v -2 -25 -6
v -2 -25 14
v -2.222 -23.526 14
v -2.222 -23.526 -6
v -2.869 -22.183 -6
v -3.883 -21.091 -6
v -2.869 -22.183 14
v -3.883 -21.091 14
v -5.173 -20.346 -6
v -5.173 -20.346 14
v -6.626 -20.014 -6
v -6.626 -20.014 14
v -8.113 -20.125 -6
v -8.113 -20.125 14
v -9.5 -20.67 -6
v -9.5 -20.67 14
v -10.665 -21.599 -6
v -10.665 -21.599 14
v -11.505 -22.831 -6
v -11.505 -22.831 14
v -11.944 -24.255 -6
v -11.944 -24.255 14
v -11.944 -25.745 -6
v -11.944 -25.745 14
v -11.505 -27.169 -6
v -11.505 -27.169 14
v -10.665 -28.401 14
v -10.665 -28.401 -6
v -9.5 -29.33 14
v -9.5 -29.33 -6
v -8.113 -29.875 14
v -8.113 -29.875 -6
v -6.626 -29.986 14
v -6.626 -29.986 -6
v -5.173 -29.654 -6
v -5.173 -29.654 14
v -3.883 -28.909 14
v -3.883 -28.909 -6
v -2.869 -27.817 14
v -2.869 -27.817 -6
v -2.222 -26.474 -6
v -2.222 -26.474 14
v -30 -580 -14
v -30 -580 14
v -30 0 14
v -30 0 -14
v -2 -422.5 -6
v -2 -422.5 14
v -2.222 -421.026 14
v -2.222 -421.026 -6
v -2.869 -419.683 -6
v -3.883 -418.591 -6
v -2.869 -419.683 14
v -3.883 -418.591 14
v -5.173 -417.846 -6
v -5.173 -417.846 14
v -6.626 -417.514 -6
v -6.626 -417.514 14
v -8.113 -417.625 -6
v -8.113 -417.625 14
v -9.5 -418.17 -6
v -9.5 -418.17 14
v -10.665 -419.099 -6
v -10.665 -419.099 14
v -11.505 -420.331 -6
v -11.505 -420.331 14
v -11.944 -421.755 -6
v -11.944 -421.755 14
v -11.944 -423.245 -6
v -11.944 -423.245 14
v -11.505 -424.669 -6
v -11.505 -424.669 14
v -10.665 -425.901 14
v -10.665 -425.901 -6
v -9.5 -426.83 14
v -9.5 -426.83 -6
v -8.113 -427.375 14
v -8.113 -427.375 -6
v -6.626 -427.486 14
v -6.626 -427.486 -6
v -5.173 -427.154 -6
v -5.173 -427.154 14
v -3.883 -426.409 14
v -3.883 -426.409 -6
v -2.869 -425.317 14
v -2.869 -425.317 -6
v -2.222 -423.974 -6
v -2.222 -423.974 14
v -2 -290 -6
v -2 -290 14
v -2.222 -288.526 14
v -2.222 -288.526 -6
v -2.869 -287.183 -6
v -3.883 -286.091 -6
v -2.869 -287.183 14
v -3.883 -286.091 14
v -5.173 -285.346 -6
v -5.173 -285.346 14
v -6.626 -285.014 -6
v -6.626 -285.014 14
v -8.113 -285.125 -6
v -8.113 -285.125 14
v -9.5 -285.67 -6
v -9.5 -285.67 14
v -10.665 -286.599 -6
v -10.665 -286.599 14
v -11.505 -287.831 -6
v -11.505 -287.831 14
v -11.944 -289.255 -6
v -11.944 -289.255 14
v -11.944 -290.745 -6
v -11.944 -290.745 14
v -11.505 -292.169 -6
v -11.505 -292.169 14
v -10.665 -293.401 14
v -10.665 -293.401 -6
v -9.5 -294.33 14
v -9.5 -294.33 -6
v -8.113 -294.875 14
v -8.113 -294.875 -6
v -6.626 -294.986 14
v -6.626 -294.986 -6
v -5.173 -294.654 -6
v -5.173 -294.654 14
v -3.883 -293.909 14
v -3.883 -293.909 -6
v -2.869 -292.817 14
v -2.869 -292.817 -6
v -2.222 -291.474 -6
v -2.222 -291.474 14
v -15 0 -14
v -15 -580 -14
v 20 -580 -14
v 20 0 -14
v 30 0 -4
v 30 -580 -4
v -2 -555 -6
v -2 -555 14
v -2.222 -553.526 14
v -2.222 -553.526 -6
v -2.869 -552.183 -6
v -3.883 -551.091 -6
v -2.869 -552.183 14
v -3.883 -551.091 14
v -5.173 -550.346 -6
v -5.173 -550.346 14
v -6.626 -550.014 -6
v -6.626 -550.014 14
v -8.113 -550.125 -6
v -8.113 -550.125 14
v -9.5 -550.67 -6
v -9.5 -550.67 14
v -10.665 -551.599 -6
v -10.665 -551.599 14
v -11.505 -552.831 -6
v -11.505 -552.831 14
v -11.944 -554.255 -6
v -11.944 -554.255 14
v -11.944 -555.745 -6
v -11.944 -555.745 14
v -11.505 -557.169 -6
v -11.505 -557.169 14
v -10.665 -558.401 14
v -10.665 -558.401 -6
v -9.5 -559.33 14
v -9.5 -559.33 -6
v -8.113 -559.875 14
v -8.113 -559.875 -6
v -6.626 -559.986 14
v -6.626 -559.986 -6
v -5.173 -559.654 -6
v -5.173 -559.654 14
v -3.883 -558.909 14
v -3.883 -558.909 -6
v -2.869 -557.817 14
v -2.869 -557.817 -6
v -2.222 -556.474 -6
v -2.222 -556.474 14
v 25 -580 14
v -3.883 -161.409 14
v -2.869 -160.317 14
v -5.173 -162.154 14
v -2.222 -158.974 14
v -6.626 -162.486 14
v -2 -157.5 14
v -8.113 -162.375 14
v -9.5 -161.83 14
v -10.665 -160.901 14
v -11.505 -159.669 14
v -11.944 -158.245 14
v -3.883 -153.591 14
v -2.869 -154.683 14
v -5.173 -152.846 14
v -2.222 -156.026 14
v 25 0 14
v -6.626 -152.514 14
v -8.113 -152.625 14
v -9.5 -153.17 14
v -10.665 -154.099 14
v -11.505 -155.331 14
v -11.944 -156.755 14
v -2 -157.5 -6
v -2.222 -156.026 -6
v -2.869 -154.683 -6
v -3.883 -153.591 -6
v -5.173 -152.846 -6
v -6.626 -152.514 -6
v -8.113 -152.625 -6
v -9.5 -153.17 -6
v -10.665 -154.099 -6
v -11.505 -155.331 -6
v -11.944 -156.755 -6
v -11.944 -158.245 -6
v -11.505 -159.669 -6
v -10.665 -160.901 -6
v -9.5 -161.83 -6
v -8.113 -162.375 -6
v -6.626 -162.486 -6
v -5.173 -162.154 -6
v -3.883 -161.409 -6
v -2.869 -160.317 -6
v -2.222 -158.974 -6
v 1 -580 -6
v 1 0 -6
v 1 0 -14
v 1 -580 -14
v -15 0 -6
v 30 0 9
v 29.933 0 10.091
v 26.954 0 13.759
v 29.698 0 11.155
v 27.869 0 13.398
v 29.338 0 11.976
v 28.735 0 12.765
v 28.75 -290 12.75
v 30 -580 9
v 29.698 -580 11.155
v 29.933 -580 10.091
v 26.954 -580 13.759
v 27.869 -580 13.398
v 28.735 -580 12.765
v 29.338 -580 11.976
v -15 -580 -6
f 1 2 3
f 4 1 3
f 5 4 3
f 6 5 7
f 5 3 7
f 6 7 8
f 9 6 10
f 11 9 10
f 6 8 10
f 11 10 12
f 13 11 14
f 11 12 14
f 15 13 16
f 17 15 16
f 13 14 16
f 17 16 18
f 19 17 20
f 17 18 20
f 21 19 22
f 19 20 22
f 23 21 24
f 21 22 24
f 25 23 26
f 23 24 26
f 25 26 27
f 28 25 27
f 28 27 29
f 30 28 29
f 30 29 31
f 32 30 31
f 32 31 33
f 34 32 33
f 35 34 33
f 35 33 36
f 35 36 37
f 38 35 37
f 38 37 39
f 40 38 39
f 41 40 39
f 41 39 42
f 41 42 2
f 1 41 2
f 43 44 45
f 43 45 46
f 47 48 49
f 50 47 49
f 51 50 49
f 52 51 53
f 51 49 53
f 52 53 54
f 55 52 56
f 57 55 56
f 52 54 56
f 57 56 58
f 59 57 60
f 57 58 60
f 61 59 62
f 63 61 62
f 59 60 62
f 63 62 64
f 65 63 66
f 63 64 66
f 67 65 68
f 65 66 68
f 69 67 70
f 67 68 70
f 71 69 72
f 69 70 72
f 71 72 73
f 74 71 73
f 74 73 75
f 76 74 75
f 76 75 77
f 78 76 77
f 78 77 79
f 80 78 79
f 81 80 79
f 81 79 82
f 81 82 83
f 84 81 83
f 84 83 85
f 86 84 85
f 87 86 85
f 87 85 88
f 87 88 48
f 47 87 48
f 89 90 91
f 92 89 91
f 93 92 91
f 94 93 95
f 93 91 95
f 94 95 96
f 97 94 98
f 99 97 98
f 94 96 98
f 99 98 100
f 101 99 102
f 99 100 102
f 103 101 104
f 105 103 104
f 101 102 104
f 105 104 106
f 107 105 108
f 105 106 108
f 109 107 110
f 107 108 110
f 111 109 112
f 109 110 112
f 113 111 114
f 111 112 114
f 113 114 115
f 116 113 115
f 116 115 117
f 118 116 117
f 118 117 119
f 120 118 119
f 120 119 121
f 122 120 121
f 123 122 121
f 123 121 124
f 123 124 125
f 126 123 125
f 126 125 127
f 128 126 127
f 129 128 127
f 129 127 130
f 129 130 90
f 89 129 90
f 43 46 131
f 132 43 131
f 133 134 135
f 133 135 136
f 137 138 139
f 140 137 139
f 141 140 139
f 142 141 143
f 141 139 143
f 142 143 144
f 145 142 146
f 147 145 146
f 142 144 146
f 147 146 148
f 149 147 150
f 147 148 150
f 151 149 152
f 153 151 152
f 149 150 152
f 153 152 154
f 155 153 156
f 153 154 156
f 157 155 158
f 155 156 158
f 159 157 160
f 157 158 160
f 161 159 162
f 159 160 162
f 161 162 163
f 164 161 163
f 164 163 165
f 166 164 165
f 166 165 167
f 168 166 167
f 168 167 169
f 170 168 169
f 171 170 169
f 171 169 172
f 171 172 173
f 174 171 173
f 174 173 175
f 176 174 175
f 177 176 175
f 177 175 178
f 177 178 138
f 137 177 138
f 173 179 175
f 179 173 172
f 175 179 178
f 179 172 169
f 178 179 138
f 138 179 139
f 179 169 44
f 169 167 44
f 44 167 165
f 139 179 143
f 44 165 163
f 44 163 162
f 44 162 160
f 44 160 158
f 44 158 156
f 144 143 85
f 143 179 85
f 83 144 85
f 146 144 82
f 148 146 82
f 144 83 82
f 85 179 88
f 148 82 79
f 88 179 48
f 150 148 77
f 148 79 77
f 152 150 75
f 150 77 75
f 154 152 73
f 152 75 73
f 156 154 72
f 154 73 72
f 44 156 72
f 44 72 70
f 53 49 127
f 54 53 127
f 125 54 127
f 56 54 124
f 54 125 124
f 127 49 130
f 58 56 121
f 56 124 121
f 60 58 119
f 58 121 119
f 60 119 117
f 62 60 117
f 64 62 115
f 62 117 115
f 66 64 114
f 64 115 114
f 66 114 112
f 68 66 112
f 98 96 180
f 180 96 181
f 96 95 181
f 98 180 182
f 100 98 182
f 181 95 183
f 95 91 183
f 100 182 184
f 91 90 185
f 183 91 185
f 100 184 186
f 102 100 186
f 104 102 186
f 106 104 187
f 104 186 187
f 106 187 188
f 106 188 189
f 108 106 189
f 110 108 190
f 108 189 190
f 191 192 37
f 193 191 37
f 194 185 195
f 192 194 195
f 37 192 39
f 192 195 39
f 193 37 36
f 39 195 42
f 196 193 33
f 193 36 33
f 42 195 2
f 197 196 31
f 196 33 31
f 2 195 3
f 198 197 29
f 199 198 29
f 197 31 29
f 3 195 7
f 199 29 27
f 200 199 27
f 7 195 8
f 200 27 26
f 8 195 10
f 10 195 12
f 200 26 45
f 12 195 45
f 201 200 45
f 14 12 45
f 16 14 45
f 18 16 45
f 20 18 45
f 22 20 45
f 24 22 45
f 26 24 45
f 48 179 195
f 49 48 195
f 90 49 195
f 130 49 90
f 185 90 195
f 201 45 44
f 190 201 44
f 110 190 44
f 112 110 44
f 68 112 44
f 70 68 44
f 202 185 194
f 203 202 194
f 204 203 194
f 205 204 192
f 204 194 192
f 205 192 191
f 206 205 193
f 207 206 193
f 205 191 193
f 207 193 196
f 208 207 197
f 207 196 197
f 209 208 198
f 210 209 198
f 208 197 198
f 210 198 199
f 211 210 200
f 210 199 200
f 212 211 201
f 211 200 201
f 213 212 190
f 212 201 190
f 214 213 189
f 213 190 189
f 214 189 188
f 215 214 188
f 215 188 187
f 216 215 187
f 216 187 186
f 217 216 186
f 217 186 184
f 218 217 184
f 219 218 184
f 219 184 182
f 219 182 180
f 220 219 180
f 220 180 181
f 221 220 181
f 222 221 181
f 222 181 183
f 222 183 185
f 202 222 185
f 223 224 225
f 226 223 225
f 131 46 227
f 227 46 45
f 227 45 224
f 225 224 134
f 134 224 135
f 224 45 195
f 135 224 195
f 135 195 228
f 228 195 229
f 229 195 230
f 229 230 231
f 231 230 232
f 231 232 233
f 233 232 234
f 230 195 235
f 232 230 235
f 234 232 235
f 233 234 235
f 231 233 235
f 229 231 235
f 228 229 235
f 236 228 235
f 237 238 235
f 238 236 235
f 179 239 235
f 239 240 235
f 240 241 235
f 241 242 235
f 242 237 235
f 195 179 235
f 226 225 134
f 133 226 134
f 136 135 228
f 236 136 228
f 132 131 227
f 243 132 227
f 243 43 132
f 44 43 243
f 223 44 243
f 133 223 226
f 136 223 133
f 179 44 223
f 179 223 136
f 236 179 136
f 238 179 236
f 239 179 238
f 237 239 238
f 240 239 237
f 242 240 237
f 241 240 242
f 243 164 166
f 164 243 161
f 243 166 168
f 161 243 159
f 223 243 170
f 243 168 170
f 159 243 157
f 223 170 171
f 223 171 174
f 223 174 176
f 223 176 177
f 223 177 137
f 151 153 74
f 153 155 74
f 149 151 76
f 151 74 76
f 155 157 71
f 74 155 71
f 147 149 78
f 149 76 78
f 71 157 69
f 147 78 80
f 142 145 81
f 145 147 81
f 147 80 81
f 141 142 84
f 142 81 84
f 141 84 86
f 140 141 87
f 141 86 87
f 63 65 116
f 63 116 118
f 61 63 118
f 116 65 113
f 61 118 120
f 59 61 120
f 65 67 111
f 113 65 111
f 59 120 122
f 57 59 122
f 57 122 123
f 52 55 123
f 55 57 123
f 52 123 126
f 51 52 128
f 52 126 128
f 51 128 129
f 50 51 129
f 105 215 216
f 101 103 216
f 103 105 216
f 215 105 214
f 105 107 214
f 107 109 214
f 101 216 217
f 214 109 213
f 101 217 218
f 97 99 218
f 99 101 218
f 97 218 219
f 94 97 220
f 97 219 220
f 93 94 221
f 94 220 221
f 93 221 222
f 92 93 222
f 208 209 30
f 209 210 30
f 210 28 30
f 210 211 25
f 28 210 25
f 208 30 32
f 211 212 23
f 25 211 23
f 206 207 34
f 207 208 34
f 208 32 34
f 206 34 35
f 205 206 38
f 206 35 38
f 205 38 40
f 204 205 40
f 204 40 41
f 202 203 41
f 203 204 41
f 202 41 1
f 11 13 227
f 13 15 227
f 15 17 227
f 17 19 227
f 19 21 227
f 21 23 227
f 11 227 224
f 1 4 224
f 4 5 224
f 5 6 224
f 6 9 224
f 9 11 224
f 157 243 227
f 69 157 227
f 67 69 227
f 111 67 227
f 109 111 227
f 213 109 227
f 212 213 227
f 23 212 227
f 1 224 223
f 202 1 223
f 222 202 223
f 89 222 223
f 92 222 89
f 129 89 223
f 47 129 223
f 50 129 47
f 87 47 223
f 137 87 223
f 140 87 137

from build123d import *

# Parameters (mm, degrees)
F1_DEPTH    = 580
F2_SIZE2    = 10
F2_SIZE     = 10
F3_T1_DEPTH = 605
F4_R        = 5
F5_DEPTH    = 28.0010001


# Not quite as in the source:
# - a fillet or chamfer that OpenCascade refuses, or shapes differently, is made with other operations: its cross-section is extruded or revolved along the edge and cut away or added


with BuildPart() as f1:
    # F0 (on Front) → F1 (new body)
    with BuildSketch(Plane.XZ):
        Polygon((30, -14), (30, 14), (-30, 14), (-30, -14), (-15, -14), (-15, -6), (1, -6), (1, -14), align=None)
    extrude(amount=F1_DEPTH)

    # F2
    f2_edges = [f1.edges().sort_by_distance(p)[0] for p in [
        (30, -290, -14),
    ]]
    chamfer(f2_edges, length=F2_SIZE, length2=F2_SIZE2)

    # F3: fillet of radius 5 on 1 edges, made by hand

    # F3_s2 → F3_t1 (cut)
    with BuildSketch(Plane.XZ.offset(-12.5)):
        with BuildLine():
            add(Edge.make_bspline(
                [(30, 9), (30, 14), (25, 14)],
                knots=[0, 0, 0, 1, 1, 1], degree=2, weights=[1, 1, 1]))
            Line((25, 14), (30, 14))
            Line((30, 14), (30, 9))
        make_face()
    extrude(amount=F3_T1_DEPTH, mode=Mode.SUBTRACT)

    # F4 (on face) → F5 (cut, through all)
    with BuildSketch(Plane.XY.offset(14)):
        with Locations((-7, -25)):
            Circle(F4_R)
        with Locations((-7, -290)):
            Circle(F4_R)
        with Locations((-7, -157.5)):
            Circle(F4_R)
        with Locations((-7, -422.5)):
            Circle(F4_R)
        with Locations((-7, -555)):
            Circle(F4_R)
    extrude(amount=-F5_DEPTH, mode=Mode.SUBTRACT)


solid = f1.part
